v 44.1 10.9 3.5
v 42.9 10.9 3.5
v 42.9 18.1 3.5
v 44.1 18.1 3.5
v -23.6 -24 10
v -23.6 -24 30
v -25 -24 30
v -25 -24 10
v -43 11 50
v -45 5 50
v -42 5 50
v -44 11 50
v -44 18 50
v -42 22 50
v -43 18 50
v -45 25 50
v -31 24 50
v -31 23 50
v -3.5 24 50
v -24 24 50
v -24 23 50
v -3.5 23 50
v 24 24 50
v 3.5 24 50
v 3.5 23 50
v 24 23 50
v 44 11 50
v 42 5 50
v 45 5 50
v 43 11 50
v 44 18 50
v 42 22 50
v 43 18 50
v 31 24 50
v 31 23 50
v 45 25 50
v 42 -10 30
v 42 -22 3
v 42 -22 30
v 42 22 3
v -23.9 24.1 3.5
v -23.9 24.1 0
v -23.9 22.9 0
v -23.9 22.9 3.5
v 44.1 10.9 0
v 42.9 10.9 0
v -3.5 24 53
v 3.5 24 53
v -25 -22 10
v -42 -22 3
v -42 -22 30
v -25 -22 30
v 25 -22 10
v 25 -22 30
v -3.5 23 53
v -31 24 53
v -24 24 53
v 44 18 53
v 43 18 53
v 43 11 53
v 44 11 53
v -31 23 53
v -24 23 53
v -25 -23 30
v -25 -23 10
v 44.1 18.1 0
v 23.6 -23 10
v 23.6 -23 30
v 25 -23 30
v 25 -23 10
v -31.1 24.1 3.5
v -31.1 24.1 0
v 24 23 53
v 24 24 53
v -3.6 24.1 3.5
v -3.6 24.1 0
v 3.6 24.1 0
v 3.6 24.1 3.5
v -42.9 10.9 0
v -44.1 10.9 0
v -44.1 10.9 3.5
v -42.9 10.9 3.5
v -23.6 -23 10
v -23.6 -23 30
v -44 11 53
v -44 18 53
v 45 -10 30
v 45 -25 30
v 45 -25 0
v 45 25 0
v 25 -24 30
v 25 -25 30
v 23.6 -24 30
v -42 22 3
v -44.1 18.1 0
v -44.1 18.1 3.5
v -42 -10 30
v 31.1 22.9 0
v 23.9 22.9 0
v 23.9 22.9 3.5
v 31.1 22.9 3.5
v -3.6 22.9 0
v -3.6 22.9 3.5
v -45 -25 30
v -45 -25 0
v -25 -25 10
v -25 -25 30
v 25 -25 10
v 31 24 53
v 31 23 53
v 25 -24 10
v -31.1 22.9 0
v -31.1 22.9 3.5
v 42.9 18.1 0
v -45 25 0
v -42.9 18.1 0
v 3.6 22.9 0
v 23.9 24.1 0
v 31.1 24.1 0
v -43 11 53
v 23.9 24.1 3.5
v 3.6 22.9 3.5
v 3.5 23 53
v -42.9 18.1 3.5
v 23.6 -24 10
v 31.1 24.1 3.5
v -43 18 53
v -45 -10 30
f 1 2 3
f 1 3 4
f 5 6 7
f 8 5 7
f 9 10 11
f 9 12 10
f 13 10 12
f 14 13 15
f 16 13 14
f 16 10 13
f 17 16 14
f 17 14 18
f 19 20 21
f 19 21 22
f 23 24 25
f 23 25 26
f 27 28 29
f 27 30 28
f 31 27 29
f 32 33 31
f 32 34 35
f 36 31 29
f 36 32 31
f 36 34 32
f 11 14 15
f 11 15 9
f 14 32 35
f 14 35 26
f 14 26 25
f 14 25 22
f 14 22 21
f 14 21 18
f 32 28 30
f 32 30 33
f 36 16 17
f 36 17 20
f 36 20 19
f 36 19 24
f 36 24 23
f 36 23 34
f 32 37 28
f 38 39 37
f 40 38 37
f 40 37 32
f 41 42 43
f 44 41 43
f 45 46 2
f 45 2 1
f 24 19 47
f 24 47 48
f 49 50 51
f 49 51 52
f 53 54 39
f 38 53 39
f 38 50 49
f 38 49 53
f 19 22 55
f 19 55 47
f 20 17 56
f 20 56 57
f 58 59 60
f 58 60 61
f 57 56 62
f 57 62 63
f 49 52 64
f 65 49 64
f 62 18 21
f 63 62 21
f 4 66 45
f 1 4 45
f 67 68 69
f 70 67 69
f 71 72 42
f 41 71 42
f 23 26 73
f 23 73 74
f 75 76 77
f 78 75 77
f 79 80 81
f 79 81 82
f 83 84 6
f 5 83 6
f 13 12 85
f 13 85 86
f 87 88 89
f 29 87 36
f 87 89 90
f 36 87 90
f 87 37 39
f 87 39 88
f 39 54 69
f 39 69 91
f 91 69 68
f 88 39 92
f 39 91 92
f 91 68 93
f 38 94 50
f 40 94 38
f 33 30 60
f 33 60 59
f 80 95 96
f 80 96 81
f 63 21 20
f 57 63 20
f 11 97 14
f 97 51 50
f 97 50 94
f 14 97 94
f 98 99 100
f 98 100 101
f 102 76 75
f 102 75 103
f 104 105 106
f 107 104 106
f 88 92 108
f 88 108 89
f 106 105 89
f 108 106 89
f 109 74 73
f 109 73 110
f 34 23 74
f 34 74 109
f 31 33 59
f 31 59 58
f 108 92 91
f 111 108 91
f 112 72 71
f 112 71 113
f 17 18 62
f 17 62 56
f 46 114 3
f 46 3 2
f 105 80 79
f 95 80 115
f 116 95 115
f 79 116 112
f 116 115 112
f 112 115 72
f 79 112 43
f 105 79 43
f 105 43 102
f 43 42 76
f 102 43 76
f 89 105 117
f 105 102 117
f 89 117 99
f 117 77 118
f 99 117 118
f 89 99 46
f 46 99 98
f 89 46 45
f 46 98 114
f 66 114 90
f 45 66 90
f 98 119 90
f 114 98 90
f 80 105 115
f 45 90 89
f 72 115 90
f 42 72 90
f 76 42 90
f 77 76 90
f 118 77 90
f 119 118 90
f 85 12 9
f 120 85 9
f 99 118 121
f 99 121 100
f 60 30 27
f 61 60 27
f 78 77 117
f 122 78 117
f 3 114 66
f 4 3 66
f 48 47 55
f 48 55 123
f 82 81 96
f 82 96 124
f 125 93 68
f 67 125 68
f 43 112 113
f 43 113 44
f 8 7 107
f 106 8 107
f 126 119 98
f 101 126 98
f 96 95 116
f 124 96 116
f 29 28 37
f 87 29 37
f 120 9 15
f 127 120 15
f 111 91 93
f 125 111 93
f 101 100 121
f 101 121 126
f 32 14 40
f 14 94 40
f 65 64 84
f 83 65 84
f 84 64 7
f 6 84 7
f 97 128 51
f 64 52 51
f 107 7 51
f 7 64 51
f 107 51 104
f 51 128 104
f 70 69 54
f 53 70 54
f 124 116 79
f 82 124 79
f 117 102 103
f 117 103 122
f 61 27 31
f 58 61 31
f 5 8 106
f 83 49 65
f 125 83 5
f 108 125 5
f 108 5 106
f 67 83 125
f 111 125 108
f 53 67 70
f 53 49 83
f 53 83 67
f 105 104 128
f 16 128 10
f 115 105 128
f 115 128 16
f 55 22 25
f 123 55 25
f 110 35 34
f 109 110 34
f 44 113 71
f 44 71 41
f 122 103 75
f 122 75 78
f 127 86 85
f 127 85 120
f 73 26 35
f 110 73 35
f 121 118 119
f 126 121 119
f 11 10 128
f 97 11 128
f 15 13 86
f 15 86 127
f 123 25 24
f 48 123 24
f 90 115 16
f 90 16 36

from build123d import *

# Parameters (mm, degrees)
F0_W      = 90
F0_H      = 50
F1_DEPTH  = 50
F2_T      = -3
F4_DEPTH  = 90.001
F6_DEPTH  = 20
F7_W      = 7
F7_H      = 1
F7_W_2    = 1
F7_H_2    = 7
F8_DEPTH  = 3
F9_W      = 7.2
F9_H      = 1.2
F9_W_2    = 1.2
F9_H_2    = 7.2
F10_DEPTH = 3.5


with BuildPart() as f1:
    # F0 (on Top) → F1 (new body)
    with BuildSketch(Plane.XY):
        Rectangle(F0_W, F0_H)
    extrude(amount=F1_DEPTH)

    # F2
    f2_openings = [f1.faces().sort_by_distance(p)[0] for p in [
        (0, 0, 50),
    ]]
    offset(amount=F2_T, openings=f2_openings)

    # F3 (on face) → F4 (cut, through all)
    with BuildSketch(Plane(origin=(-45, 0, 0), x_dir=(0, -1, 0), z_dir=(-1, 0, 0))):
        Polygon((25, 30), (25, 50), (-5, 50), (10, 30), align=None)
    extrude(amount=-F4_DEPTH, mode=Mode.SUBTRACT)

    # F5 (on face) → F6 (cut)
    with BuildSketch(Plane.XY.offset(30)):
        Polygon((25, -22), (-25, -22), (-25, -23), (-23.6, -23), (-23.6, -24), (-25, -24), (-25, -25), (25, -25), (25, -24), (23.6, -24), (23.6, -23), (25, -23), align=None)
    extrude(amount=-F6_DEPTH, mode=Mode.SUBTRACT)

    # F7 (on face) → F8 (join)
    with BuildSketch(Plane.XY.offset(50)):
        with Locations((-27.5, 23.5)):
            Rectangle(F7_W, F7_H)
        with Locations((-43.5, 14.5)):
            Rectangle(F7_W_2, F7_H_2)
        with Locations((27.5, 23.5)):
            Rectangle(F7_W, F7_H)
        with Locations((43.5, 14.5)):
            Rectangle(F7_W_2, F7_H_2)
        with Locations((0, 23.5)):
            Rectangle(F7_W, F7_H)
    extrude(amount=F8_DEPTH)

    # F9 (on face) → F10 (cut)
    with BuildSketch(Plane(origin=(0, 0, 0), x_dir=(1, 0, 0), z_dir=(0, 0, -1))):
        with Locations((0, -23.5)):
            Rectangle(F9_W, F9_H)
        with Locations((27.5, -23.5)):
            Rectangle(F9_W, F9_H)
        with Locations((-27.5, -23.5)):
            Rectangle(F9_W, F9_H)
        with Locations((43.5, -14.5)):
            Rectangle(F9_W_2, F9_H_2)
        with Locations((-43.5, -14.5)):
            Rectangle(F9_W_2, F9_H_2)
    extrude(amount=-F10_DEPTH, mode=Mode.SUBTRACT)


solid = f1.part
